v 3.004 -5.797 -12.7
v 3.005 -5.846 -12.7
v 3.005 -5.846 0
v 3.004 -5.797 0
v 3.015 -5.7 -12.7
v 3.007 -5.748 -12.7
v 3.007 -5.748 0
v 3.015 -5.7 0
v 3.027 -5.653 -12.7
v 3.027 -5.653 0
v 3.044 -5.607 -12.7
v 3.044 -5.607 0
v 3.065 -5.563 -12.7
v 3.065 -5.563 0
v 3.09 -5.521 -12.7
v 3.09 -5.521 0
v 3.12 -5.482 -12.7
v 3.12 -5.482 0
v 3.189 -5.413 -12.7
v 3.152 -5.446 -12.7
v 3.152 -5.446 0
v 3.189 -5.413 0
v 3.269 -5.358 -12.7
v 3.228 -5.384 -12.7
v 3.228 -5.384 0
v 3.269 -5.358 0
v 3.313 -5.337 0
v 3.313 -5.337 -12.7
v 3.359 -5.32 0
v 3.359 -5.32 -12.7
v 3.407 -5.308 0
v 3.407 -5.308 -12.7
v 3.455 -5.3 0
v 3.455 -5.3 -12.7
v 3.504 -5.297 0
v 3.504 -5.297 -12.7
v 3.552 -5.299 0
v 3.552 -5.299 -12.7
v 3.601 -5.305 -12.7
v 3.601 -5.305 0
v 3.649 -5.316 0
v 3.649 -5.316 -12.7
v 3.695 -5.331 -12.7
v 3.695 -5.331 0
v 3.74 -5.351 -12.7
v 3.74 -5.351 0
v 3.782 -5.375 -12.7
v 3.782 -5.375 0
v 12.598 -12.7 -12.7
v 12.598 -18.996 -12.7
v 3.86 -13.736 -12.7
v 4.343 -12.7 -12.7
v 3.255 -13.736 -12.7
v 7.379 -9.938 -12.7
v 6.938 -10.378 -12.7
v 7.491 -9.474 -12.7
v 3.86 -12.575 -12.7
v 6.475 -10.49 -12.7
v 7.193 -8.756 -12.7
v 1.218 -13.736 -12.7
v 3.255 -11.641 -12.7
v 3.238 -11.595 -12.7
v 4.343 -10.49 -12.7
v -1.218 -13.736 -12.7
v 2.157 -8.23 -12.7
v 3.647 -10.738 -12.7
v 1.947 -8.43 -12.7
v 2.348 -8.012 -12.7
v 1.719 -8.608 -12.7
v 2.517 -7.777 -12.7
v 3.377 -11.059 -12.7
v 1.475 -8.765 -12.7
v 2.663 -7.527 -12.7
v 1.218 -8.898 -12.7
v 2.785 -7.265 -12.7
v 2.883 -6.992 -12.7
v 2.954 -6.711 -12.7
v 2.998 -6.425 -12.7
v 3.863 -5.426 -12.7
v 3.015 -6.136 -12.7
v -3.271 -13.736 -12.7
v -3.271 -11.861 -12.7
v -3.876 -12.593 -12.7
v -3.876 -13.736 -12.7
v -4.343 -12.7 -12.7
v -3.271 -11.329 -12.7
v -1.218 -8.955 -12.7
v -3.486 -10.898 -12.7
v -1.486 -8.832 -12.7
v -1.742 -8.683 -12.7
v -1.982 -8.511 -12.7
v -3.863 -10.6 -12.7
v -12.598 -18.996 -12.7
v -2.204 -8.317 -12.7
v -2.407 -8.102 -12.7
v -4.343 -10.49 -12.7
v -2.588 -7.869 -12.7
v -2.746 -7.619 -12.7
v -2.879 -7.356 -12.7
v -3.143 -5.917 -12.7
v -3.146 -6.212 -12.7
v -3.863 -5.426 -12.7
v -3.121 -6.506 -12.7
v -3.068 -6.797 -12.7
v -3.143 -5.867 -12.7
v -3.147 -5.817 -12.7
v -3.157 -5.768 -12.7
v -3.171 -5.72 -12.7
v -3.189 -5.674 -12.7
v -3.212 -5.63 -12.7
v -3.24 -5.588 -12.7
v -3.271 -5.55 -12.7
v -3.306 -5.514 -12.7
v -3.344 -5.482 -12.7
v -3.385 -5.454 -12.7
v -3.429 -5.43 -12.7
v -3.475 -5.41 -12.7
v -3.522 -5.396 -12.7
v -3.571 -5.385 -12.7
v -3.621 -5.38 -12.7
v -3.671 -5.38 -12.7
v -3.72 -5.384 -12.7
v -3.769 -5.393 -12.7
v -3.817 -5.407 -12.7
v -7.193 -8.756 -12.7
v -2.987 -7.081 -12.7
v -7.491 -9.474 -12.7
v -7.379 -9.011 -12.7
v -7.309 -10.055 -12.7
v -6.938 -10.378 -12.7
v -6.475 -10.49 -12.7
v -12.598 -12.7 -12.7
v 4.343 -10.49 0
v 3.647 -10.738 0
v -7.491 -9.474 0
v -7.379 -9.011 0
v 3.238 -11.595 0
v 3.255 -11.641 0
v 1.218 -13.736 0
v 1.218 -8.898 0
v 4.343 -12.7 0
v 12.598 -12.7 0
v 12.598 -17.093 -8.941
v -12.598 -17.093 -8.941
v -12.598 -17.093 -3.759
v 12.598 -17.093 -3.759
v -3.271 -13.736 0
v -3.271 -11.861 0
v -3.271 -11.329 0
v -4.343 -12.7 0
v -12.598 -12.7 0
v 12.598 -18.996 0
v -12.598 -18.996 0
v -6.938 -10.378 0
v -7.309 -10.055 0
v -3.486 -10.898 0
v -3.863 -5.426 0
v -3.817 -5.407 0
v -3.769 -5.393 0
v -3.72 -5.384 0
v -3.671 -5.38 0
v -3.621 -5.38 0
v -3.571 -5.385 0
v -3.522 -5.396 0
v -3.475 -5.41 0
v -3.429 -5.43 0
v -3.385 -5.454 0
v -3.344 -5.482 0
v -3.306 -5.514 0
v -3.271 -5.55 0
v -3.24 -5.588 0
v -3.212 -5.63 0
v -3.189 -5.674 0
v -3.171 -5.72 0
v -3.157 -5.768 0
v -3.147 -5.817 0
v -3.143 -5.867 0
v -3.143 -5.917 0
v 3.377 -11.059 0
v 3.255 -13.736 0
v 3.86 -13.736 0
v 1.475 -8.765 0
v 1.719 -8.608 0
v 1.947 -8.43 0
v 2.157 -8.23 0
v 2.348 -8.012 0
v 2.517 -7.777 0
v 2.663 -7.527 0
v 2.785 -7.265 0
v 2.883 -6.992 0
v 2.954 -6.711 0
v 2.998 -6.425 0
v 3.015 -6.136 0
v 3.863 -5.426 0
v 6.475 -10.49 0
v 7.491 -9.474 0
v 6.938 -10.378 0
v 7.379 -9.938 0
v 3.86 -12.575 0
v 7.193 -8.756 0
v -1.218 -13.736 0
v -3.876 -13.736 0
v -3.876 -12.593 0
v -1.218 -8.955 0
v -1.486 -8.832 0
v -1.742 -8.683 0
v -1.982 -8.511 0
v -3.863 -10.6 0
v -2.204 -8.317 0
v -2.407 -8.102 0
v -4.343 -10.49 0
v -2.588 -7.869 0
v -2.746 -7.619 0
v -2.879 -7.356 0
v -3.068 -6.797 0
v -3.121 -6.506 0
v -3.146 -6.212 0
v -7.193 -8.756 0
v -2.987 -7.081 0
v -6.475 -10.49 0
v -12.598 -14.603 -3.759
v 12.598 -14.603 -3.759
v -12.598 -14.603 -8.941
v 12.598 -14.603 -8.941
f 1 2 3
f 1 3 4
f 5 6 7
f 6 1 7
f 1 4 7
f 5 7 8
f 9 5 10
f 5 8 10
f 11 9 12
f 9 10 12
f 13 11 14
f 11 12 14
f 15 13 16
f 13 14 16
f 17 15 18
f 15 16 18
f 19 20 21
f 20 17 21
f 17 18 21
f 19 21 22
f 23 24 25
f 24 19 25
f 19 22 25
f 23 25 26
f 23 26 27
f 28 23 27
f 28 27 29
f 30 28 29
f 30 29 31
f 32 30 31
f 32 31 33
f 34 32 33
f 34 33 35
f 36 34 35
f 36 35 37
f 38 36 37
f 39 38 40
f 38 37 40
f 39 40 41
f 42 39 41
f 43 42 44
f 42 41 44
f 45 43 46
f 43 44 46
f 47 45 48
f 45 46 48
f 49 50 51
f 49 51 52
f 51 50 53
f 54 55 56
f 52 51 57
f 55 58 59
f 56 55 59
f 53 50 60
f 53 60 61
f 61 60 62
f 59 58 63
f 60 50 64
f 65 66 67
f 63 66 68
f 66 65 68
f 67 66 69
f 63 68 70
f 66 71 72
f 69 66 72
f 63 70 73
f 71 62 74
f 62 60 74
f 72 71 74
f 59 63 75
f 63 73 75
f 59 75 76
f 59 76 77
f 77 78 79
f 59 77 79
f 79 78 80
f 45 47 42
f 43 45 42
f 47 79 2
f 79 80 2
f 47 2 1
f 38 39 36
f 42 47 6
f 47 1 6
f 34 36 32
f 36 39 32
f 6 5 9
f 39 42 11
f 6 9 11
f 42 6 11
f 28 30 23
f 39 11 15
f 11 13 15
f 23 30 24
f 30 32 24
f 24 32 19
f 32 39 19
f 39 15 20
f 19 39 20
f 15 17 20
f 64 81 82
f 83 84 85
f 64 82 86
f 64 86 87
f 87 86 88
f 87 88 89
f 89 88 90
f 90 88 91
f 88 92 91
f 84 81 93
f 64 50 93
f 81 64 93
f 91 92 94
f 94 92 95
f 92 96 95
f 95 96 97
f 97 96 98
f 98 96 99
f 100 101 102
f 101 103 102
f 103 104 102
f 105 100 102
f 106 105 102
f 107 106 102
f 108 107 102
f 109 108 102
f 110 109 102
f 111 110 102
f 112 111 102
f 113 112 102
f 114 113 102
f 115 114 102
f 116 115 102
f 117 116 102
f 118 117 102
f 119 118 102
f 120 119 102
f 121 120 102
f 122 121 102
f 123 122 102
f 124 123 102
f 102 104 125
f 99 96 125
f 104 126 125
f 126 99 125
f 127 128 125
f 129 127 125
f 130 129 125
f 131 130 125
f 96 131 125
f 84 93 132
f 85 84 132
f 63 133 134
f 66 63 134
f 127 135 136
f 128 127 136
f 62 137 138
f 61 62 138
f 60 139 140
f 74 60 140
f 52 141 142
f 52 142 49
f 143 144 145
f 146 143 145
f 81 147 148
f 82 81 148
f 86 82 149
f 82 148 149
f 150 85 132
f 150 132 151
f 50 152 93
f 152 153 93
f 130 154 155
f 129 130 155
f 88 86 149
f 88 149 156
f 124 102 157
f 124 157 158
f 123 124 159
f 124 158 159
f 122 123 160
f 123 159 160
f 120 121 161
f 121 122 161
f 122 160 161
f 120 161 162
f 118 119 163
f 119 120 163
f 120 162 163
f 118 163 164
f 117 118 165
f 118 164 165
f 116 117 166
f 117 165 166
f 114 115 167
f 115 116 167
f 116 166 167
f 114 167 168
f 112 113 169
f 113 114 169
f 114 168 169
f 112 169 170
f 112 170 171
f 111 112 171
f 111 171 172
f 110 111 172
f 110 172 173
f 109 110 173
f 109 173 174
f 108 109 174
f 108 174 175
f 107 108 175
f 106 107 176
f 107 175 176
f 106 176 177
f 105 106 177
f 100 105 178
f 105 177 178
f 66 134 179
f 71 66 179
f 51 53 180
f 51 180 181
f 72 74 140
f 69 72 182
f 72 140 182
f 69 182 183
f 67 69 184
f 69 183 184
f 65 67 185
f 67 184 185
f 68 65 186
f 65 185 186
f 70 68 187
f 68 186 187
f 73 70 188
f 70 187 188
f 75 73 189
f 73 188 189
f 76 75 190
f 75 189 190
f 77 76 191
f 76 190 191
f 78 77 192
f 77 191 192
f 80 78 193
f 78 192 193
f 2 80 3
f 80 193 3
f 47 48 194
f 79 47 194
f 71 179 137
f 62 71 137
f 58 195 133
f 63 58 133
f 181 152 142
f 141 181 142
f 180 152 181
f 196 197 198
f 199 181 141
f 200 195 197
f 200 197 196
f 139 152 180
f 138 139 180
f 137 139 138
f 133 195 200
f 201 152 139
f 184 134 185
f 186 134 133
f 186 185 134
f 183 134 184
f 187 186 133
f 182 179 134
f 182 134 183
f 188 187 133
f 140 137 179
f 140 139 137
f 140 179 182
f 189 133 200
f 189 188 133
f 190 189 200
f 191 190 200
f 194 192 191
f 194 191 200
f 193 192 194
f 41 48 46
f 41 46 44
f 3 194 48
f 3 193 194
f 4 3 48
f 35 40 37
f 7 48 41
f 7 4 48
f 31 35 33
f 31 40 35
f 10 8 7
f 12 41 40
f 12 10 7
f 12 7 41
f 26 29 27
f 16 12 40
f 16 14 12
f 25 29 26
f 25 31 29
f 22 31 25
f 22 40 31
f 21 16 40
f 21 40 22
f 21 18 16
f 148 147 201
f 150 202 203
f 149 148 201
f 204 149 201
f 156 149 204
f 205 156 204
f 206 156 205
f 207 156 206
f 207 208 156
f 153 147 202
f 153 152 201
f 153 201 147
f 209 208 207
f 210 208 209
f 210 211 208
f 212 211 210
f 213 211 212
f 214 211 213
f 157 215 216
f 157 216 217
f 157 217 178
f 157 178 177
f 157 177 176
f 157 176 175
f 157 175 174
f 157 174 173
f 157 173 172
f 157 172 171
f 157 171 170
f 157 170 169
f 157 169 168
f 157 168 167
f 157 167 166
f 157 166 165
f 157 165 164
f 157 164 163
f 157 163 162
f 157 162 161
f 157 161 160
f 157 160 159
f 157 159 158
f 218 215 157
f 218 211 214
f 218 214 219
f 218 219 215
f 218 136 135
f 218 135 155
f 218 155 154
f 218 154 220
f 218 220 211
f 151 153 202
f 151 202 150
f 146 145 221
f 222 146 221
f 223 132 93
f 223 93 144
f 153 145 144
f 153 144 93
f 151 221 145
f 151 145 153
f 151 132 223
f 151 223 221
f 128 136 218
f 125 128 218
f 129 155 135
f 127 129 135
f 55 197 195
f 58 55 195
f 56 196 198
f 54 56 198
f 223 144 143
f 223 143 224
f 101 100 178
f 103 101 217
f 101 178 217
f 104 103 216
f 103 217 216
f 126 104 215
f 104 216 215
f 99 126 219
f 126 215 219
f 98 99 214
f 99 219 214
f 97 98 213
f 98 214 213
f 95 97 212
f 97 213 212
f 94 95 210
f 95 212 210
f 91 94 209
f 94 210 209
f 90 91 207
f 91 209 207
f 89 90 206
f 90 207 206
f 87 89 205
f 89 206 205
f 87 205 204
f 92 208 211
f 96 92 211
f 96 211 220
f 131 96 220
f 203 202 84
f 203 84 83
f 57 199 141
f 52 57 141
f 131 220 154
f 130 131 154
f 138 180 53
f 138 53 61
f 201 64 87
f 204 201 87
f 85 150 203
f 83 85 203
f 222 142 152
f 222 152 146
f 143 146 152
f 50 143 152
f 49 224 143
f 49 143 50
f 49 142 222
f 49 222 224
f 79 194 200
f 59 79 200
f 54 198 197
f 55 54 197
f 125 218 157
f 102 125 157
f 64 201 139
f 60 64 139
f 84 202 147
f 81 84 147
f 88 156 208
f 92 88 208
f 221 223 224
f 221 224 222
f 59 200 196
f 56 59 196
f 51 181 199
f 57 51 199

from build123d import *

# Parameters (mm, degrees)
BOSS_EXTRUDE1_DEPTH     = 12.7
SKETCH10_R              = 3.082136138
CUT_EXTRUDE1_DEPTH      = 26.185474767
SKETCH11_W              = 2.435876878
SKETCH11_H              = 7.908405343
CUT_EXTRUDE2_DEPTH      = 26.185474767
CUT_EXTRUDE4_DEPTH      = 31.460304214
CUT_EXTRUDE4_DEPTH_BACK = 31.460304214
SKETCH13_W              = 5.182015338
SKETCH13_H              = 2.489456313
FILLET3_R               = 0.508
SKETCH17_W              = 0.605016918
SKETCH17_H              = 2.095446093
SKETCH17_W_2            = 0.604461085
SKETCH17_H_2            = 2.141007526
CUT_EXTRUDE7_DEPTH      = 26.185474767
SKETCH19_W              = 12.7
SKETCH19_H              = 6.295576116
BOSS_EXTRUDE2_DEPTH     = 3.048
SKETCH20_W              = 12.7
SKETCH20_H              = 6.295576116
BOSS_EXTRUDE3_DEPTH     = 2.0066
SKETCH22_W              = 5.182015338
SKETCH22_H              = 2.489456313
CUT_EXTRUDE8_DEPTH      = 35.014712144


with BuildPart() as part:
    # Sketch5 → Boss-Extrude1 (new body)
    with BuildSketch(Plane.XY):
        Polygon((-6.474794456, -10.4902), (-6.938297275, -10.378313453), (-7.308763147, -10.05450356), (-7.490794456, -9.4742), (-7.378907909, -9.01069718), (-7.193214945, -8.75577951), (-3.863171405, -5.42573597), (-2.833127272, -4.737482484), (-1.618107374, -4.4958), (1.618107374, -4.4958), (2.668236067, -4.674493152), (3.863171405, -5.42573597), (7.193214945, -8.75577951), (7.490794456, -9.4742), (7.378907909, -9.93770282), (6.938297275, -10.378313453), (6.474794456, -10.4902), (4.3434, -10.4902), (3.646537163, -10.737670005), (3.377082754, -11.059343535), (3.2385, -11.5951), (3.485970005, -12.291962837), (3.807643535, -12.561417246), (4.3434, -12.7), (10.5918, -12.7), (10.5918, -18.995576116), (-9.5504, -18.995576116), (-9.5504, -12.7), (-4.3434, -12.7), (-3.863171405, -12.590180165), (-3.485969976, -12.291962837), (-3.271081829, -11.861441531), (-3.271081829, -11.328758469), (-3.485969976, -10.898237163), (-3.863171405, -10.600019835), (-4.3434, -10.4902), align=None)
    extrude(amount=-BOSS_EXTRUDE1_DEPTH)

    # Sketch10 → Cut-Extrude1 (cut, through all)
    with BuildSketch(Plane.XY):
        with Locations((-0.066530556, -6.095976424)):
            Circle(SKETCH10_R)
    extrude(amount=-CUT_EXTRUDE1_DEPTH, mode=Mode.SUBTRACT)

    # Sketch11 → Cut-Extrude2 (cut, through all)
    with BuildSketch(Plane.XY):
        with Locations((0, -9.781904855)):
            Rectangle(SKETCH11_W, SKETCH11_H)
    extrude(amount=-CUT_EXTRUDE2_DEPTH, mode=Mode.SUBTRACT)

    # Sketch13 → Cut-Extrude4 (cut, two sides: drawn at the far end of the back side and taken through both)
    with BuildSketch(Plane.ZY.offset(9.5504).offset(-CUT_EXTRUDE4_DEPTH_BACK)):
        with Locations((-6.35, -15.847788058)):
            Rectangle(SKETCH13_W, SKETCH13_H)
    extrude(amount=CUT_EXTRUDE4_DEPTH + CUT_EXTRUDE4_DEPTH_BACK, mode=Mode.SUBTRACT)

    # Fillet3
    # the kernel refuses this fillet: 0.508 mm, written as the material it takes off along each edge
    with BuildSketch(Plane(origin=(2.668236067, -4.674493152, 3.28944818), x_dir=(0.8465916632907231, -0.5322429479538896, 0), z_dir=(0, 0, -1))) as fillet3_piece_1:
        with BuildLine():
            CenterArc((1.315779272, 0.508), FILLET3_R, 143.192029884, 126.807970116)
            Line((0.90905007, 0.812360569), (0.900915486, 0.81844778))
            ThreePointArc((0.900915486, 0.81844778), (0.488321858, 0.368360866), (-0.005137978, 0.008765089))
            Line((-0.005137978, 0.008765089), (0, -0.01016))
            Line((0, -0.01016), (1.315779272, -0.01016))
            Line((1.315779272, -0.01016), (1.315779272, 0))
        make_face()
    extrude(amount=19.278896361, mode=Mode.SUBTRACT)
    with BuildSketch(Plane(origin=(-2.833127272, -4.737482484, 3.097058862), x_dir=(-0.2544986167721869, -0.9670731379068719, 0), z_dir=(0, 0, -1))) as fillet3_piece_2:
        with BuildLine():
            CenterArc((1.319821852, 0.497962426), FILLET3_R, 140.517787887, 118.073467257)
            Line((0.927736265, 0.820968451), (0.919894553, 0.827428572))
            ThreePointArc((0.919894553, 0.827428572), (0.4571351, 0.418092896), (-0.006733033, 0.007608671))
            Line((-0.006733033, 0.007608671), (0.002009719, -0.009959249))
            ThreePointArc((0.002009719, -0.009959249), (0.60966796, 0.050739942), (1.217326201, -0.009959249))
            Line((1.217326201, -0.009959249), (1.219335919, 0))
        make_face()
    extrude(amount=18.894117724, mode=Mode.SUBTRACT)

    # Sketch17 → Cut-Extrude7 (cut, through all)
    with BuildSketch(Plane.XY):
        with Locations((3.55718824, -12.68838448)):
            Rectangle(SKETCH17_W, SKETCH17_H)
        with Locations((-3.573312372, -12.665603763)):
            Rectangle(SKETCH17_W_2, SKETCH17_H_2)
    extrude(amount=-CUT_EXTRUDE7_DEPTH, mode=Mode.SUBTRACT)

    # Sketch19 → Boss-Extrude2 (add)
    with BuildSketch(Plane.ZY.offset(9.5504)):
        with Locations((-6.35, -15.847788058)):
            Rectangle(SKETCH19_W, SKETCH19_H)
    extrude(amount=BOSS_EXTRUDE2_DEPTH)

    # Sketch20 → Boss-Extrude3 (add)
    with BuildSketch(Plane(origin=(10.5918, 0, 0), x_dir=(0, 0, -1), z_dir=(1, 0, 0))):
        with Locations((6.35, -15.847788058)):
            Rectangle(SKETCH20_W, SKETCH20_H)
    extrude(amount=BOSS_EXTRUDE3_DEPTH)

    # Sketch22 → Cut-Extrude8 (cut, through all)
    with BuildSketch(Plane.ZY.offset(12.5984)):
        with Locations((-6.35, -15.847788058)):
            Rectangle(SKETCH22_W, SKETCH22_H)
    extrude(amount=-CUT_EXTRUDE8_DEPTH, mode=Mode.SUBTRACT)


solid = part.part
